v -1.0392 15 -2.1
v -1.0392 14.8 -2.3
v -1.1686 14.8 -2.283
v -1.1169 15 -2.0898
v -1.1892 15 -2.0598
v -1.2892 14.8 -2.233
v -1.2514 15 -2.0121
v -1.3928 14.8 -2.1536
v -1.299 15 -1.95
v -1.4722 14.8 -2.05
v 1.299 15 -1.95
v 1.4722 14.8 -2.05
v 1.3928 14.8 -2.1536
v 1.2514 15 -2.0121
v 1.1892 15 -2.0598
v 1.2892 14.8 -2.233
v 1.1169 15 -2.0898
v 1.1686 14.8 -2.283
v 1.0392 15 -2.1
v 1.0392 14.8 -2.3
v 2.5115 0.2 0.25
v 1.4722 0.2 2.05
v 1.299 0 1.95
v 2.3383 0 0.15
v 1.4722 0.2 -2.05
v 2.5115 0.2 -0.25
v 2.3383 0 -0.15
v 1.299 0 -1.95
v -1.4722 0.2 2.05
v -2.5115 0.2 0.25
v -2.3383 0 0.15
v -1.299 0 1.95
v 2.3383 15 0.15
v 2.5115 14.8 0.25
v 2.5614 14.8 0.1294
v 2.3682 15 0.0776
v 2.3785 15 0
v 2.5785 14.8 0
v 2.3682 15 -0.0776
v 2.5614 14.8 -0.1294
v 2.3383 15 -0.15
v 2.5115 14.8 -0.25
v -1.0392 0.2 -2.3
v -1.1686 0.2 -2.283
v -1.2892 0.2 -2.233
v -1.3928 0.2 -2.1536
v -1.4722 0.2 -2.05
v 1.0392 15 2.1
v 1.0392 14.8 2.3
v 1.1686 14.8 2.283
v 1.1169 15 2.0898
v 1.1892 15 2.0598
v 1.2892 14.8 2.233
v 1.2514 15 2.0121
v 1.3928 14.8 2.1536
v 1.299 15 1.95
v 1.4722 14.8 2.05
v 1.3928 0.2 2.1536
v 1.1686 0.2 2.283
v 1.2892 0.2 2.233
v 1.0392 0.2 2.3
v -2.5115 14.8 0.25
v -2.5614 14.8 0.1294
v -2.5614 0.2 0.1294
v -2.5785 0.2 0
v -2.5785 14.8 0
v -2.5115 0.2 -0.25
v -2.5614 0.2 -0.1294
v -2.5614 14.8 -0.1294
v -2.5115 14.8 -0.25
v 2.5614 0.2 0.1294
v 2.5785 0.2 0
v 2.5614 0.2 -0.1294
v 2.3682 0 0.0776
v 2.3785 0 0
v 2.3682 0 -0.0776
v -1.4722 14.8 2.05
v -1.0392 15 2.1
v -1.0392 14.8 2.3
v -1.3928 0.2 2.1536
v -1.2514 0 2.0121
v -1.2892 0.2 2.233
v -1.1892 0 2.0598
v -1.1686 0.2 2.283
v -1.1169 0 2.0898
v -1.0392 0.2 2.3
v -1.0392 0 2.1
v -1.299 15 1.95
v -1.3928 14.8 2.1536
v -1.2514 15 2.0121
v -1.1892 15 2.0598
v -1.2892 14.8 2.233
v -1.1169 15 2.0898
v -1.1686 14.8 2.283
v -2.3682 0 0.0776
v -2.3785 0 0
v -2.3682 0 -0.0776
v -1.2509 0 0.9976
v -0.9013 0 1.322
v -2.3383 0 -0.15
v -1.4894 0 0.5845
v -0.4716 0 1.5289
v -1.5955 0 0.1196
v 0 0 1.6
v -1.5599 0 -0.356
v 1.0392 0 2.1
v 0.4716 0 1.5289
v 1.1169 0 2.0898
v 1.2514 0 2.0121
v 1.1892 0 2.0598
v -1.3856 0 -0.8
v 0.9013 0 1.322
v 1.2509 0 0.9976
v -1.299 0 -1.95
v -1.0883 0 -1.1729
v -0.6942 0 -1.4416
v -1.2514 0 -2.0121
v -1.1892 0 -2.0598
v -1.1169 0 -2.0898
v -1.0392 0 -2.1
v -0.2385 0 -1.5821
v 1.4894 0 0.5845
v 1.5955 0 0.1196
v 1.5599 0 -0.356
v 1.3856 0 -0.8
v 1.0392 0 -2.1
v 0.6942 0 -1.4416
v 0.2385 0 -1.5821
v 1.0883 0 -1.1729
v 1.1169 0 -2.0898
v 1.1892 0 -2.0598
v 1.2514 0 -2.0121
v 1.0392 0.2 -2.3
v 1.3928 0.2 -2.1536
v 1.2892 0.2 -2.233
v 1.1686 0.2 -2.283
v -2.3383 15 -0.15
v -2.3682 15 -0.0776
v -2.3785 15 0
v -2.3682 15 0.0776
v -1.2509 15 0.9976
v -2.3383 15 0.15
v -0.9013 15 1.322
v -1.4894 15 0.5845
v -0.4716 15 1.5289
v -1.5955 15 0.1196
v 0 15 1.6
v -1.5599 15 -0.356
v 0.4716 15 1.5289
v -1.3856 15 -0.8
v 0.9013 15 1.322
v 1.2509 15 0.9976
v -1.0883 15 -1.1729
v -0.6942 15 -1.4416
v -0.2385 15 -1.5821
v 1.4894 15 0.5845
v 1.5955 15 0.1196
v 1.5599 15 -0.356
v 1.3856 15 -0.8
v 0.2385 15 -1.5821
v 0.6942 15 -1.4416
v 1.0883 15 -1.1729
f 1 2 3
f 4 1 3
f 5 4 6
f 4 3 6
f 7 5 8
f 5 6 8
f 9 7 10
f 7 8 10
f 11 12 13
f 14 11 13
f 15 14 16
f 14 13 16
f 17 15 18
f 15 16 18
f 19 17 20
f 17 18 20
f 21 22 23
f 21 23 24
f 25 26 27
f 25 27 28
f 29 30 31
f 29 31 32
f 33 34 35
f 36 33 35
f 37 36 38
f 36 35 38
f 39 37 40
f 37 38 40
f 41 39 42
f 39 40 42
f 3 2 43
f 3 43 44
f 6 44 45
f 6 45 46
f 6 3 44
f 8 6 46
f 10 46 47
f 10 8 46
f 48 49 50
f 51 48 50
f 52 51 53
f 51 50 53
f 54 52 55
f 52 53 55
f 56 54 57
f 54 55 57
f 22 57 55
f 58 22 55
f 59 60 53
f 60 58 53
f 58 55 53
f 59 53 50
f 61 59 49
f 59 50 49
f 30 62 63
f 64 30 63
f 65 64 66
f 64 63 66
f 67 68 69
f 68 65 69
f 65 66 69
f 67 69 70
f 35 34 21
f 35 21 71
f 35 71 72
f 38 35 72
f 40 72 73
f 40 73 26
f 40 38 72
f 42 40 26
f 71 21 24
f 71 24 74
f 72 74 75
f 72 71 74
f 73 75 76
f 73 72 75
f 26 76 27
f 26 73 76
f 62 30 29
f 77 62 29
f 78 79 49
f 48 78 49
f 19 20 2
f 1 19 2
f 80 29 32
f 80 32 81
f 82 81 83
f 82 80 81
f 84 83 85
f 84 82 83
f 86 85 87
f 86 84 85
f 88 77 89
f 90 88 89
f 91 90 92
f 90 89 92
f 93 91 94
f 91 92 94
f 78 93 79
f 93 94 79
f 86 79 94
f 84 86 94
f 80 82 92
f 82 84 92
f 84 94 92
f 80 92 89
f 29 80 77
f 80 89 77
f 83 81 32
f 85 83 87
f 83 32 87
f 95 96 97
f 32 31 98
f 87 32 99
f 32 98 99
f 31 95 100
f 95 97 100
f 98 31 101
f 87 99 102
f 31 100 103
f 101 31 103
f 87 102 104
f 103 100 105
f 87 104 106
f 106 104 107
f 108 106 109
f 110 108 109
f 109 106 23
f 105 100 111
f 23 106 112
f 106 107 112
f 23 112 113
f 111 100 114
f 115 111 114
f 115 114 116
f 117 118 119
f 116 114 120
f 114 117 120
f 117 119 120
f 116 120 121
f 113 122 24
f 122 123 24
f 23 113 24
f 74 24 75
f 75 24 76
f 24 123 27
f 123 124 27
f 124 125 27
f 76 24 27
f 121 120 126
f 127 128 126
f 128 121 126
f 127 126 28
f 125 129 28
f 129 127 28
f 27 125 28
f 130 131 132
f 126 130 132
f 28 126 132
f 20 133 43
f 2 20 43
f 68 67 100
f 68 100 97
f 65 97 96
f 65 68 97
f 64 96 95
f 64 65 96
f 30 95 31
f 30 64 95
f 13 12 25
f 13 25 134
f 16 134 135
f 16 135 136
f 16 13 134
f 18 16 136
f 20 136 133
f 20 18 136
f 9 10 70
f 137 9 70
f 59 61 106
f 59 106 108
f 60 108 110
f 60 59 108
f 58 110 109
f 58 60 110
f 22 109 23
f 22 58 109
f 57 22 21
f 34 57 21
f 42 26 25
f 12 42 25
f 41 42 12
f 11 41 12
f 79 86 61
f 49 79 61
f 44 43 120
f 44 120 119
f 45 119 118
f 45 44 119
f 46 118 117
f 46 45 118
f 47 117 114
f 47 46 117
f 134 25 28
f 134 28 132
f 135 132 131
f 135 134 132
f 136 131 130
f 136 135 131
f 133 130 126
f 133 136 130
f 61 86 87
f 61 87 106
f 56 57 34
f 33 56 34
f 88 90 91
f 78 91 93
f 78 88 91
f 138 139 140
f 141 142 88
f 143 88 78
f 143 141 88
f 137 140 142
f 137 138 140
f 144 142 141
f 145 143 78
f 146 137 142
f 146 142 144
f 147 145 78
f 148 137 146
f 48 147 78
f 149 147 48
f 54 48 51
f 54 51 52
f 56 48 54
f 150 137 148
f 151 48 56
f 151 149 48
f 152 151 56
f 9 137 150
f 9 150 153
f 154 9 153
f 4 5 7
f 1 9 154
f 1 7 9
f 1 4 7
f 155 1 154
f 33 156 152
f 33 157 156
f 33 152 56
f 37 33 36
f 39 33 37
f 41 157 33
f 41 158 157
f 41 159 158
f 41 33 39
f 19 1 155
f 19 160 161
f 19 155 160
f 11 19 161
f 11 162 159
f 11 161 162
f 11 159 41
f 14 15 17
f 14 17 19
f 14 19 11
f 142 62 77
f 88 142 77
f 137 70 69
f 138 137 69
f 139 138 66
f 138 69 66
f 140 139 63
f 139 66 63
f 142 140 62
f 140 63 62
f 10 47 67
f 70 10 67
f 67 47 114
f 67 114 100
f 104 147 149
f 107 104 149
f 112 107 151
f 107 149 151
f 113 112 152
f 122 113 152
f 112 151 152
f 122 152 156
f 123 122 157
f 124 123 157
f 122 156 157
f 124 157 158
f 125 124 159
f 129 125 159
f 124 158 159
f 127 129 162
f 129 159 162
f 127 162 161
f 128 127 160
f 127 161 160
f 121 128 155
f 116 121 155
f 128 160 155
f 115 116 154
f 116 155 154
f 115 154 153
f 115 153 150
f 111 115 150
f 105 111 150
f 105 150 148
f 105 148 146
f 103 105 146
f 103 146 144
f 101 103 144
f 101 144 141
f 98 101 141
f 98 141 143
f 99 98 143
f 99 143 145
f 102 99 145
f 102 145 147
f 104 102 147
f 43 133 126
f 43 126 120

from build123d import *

# Parameters (mm, degrees)
BOSS_EXTRUDE1_DEPTH = 15
SKETCH2_R           = 1.6
CUT_EXTRUDE1_DEPTH  = 16.405951231
FILLET1_R           = 0.5
CHAMFER1_SIZE       = 0.2


with BuildPart() as part:
    # Sketch1 → Boss-Extrude1 (new body)
    with BuildSketch(Plane(origin=(0, 0, 0), x_dir=(1, 0, 0), z_dir=(0, 1, 0))):
        Polygon((1.327905619, -2.3), (2.655811238, 0), (1.327905619, 2.3), (-1.327905619, 2.3), (-2.655811238, 0), (-1.327905619, -2.3), align=None)
    extrude(amount=BOSS_EXTRUDE1_DEPTH)

    # Sketch2 → Cut-Extrude1 (cut, through all)
    with BuildSketch(Plane(origin=(0, 15, 0), x_dir=(1, 0, 0), z_dir=(0, 1, 0))):
        with Locations(Location((0, 0, 0), (0, 0, 270))):
            Circle(SKETCH2_R)
    extrude(amount=-CUT_EXTRUDE1_DEPTH, mode=Mode.SUBTRACT)

    # Fillet1
    fillet1_edges = [part.edges().sort_by_distance(p)[0] for p in [
        (-1.327905619, 7.5, 2.3),
        (-2.655811238, 7.5, 0),
        (-1.327905619, 7.5, -2.3),
        (1.327905619, 7.5, -2.3),
        (2.655811238, 7.5, 0),
        (1.327905619, 7.5, 2.3),
    ]]
    fillet(fillet1_edges, radius=FILLET1_R)

    # Chamfer1
    chamfer1_edges = [part.edges().sort_by_distance(p)[0] for p in [
        (0, 0, 2.3),
        (0, 15, 2.3),
        (-1.991858429, 0, 1.15),
        (-1.991858429, 0, -1.15),
        (0, 0, -2.3),
        (1.991858429, 0, -1.15),
        (1.991858429, 0, 1.15),
        (1.289230485, 0, 2.233012702),
        (2.578460969, 0, 0),
        (1.289230485, 0, -2.233012702),
        (-1.289230485, 0, -2.233012702),
        (-2.578460969, 0, 0),
        (-1.289230485, 0, 2.233012702),
        (-1.991858429, 15, 1.15),
        (1.991858429, 15, 1.15),
        (1.991858429, 15, -1.15),
        (0, 15, -2.3),
        (-1.991858429, 15, -1.15),
        (1.289230485, 15, 2.233012702),
        (2.578460969, 15, 0),
        (1.289230485, 15, -2.233012702),
        (-1.289230485, 15, -2.233012702),
        (-2.578460969, 15, 0),
        (-1.289230485, 15, 2.233012702),
    ]]
    chamfer(chamfer1_edges, length=CHAMFER1_SIZE)


solid = part.part
